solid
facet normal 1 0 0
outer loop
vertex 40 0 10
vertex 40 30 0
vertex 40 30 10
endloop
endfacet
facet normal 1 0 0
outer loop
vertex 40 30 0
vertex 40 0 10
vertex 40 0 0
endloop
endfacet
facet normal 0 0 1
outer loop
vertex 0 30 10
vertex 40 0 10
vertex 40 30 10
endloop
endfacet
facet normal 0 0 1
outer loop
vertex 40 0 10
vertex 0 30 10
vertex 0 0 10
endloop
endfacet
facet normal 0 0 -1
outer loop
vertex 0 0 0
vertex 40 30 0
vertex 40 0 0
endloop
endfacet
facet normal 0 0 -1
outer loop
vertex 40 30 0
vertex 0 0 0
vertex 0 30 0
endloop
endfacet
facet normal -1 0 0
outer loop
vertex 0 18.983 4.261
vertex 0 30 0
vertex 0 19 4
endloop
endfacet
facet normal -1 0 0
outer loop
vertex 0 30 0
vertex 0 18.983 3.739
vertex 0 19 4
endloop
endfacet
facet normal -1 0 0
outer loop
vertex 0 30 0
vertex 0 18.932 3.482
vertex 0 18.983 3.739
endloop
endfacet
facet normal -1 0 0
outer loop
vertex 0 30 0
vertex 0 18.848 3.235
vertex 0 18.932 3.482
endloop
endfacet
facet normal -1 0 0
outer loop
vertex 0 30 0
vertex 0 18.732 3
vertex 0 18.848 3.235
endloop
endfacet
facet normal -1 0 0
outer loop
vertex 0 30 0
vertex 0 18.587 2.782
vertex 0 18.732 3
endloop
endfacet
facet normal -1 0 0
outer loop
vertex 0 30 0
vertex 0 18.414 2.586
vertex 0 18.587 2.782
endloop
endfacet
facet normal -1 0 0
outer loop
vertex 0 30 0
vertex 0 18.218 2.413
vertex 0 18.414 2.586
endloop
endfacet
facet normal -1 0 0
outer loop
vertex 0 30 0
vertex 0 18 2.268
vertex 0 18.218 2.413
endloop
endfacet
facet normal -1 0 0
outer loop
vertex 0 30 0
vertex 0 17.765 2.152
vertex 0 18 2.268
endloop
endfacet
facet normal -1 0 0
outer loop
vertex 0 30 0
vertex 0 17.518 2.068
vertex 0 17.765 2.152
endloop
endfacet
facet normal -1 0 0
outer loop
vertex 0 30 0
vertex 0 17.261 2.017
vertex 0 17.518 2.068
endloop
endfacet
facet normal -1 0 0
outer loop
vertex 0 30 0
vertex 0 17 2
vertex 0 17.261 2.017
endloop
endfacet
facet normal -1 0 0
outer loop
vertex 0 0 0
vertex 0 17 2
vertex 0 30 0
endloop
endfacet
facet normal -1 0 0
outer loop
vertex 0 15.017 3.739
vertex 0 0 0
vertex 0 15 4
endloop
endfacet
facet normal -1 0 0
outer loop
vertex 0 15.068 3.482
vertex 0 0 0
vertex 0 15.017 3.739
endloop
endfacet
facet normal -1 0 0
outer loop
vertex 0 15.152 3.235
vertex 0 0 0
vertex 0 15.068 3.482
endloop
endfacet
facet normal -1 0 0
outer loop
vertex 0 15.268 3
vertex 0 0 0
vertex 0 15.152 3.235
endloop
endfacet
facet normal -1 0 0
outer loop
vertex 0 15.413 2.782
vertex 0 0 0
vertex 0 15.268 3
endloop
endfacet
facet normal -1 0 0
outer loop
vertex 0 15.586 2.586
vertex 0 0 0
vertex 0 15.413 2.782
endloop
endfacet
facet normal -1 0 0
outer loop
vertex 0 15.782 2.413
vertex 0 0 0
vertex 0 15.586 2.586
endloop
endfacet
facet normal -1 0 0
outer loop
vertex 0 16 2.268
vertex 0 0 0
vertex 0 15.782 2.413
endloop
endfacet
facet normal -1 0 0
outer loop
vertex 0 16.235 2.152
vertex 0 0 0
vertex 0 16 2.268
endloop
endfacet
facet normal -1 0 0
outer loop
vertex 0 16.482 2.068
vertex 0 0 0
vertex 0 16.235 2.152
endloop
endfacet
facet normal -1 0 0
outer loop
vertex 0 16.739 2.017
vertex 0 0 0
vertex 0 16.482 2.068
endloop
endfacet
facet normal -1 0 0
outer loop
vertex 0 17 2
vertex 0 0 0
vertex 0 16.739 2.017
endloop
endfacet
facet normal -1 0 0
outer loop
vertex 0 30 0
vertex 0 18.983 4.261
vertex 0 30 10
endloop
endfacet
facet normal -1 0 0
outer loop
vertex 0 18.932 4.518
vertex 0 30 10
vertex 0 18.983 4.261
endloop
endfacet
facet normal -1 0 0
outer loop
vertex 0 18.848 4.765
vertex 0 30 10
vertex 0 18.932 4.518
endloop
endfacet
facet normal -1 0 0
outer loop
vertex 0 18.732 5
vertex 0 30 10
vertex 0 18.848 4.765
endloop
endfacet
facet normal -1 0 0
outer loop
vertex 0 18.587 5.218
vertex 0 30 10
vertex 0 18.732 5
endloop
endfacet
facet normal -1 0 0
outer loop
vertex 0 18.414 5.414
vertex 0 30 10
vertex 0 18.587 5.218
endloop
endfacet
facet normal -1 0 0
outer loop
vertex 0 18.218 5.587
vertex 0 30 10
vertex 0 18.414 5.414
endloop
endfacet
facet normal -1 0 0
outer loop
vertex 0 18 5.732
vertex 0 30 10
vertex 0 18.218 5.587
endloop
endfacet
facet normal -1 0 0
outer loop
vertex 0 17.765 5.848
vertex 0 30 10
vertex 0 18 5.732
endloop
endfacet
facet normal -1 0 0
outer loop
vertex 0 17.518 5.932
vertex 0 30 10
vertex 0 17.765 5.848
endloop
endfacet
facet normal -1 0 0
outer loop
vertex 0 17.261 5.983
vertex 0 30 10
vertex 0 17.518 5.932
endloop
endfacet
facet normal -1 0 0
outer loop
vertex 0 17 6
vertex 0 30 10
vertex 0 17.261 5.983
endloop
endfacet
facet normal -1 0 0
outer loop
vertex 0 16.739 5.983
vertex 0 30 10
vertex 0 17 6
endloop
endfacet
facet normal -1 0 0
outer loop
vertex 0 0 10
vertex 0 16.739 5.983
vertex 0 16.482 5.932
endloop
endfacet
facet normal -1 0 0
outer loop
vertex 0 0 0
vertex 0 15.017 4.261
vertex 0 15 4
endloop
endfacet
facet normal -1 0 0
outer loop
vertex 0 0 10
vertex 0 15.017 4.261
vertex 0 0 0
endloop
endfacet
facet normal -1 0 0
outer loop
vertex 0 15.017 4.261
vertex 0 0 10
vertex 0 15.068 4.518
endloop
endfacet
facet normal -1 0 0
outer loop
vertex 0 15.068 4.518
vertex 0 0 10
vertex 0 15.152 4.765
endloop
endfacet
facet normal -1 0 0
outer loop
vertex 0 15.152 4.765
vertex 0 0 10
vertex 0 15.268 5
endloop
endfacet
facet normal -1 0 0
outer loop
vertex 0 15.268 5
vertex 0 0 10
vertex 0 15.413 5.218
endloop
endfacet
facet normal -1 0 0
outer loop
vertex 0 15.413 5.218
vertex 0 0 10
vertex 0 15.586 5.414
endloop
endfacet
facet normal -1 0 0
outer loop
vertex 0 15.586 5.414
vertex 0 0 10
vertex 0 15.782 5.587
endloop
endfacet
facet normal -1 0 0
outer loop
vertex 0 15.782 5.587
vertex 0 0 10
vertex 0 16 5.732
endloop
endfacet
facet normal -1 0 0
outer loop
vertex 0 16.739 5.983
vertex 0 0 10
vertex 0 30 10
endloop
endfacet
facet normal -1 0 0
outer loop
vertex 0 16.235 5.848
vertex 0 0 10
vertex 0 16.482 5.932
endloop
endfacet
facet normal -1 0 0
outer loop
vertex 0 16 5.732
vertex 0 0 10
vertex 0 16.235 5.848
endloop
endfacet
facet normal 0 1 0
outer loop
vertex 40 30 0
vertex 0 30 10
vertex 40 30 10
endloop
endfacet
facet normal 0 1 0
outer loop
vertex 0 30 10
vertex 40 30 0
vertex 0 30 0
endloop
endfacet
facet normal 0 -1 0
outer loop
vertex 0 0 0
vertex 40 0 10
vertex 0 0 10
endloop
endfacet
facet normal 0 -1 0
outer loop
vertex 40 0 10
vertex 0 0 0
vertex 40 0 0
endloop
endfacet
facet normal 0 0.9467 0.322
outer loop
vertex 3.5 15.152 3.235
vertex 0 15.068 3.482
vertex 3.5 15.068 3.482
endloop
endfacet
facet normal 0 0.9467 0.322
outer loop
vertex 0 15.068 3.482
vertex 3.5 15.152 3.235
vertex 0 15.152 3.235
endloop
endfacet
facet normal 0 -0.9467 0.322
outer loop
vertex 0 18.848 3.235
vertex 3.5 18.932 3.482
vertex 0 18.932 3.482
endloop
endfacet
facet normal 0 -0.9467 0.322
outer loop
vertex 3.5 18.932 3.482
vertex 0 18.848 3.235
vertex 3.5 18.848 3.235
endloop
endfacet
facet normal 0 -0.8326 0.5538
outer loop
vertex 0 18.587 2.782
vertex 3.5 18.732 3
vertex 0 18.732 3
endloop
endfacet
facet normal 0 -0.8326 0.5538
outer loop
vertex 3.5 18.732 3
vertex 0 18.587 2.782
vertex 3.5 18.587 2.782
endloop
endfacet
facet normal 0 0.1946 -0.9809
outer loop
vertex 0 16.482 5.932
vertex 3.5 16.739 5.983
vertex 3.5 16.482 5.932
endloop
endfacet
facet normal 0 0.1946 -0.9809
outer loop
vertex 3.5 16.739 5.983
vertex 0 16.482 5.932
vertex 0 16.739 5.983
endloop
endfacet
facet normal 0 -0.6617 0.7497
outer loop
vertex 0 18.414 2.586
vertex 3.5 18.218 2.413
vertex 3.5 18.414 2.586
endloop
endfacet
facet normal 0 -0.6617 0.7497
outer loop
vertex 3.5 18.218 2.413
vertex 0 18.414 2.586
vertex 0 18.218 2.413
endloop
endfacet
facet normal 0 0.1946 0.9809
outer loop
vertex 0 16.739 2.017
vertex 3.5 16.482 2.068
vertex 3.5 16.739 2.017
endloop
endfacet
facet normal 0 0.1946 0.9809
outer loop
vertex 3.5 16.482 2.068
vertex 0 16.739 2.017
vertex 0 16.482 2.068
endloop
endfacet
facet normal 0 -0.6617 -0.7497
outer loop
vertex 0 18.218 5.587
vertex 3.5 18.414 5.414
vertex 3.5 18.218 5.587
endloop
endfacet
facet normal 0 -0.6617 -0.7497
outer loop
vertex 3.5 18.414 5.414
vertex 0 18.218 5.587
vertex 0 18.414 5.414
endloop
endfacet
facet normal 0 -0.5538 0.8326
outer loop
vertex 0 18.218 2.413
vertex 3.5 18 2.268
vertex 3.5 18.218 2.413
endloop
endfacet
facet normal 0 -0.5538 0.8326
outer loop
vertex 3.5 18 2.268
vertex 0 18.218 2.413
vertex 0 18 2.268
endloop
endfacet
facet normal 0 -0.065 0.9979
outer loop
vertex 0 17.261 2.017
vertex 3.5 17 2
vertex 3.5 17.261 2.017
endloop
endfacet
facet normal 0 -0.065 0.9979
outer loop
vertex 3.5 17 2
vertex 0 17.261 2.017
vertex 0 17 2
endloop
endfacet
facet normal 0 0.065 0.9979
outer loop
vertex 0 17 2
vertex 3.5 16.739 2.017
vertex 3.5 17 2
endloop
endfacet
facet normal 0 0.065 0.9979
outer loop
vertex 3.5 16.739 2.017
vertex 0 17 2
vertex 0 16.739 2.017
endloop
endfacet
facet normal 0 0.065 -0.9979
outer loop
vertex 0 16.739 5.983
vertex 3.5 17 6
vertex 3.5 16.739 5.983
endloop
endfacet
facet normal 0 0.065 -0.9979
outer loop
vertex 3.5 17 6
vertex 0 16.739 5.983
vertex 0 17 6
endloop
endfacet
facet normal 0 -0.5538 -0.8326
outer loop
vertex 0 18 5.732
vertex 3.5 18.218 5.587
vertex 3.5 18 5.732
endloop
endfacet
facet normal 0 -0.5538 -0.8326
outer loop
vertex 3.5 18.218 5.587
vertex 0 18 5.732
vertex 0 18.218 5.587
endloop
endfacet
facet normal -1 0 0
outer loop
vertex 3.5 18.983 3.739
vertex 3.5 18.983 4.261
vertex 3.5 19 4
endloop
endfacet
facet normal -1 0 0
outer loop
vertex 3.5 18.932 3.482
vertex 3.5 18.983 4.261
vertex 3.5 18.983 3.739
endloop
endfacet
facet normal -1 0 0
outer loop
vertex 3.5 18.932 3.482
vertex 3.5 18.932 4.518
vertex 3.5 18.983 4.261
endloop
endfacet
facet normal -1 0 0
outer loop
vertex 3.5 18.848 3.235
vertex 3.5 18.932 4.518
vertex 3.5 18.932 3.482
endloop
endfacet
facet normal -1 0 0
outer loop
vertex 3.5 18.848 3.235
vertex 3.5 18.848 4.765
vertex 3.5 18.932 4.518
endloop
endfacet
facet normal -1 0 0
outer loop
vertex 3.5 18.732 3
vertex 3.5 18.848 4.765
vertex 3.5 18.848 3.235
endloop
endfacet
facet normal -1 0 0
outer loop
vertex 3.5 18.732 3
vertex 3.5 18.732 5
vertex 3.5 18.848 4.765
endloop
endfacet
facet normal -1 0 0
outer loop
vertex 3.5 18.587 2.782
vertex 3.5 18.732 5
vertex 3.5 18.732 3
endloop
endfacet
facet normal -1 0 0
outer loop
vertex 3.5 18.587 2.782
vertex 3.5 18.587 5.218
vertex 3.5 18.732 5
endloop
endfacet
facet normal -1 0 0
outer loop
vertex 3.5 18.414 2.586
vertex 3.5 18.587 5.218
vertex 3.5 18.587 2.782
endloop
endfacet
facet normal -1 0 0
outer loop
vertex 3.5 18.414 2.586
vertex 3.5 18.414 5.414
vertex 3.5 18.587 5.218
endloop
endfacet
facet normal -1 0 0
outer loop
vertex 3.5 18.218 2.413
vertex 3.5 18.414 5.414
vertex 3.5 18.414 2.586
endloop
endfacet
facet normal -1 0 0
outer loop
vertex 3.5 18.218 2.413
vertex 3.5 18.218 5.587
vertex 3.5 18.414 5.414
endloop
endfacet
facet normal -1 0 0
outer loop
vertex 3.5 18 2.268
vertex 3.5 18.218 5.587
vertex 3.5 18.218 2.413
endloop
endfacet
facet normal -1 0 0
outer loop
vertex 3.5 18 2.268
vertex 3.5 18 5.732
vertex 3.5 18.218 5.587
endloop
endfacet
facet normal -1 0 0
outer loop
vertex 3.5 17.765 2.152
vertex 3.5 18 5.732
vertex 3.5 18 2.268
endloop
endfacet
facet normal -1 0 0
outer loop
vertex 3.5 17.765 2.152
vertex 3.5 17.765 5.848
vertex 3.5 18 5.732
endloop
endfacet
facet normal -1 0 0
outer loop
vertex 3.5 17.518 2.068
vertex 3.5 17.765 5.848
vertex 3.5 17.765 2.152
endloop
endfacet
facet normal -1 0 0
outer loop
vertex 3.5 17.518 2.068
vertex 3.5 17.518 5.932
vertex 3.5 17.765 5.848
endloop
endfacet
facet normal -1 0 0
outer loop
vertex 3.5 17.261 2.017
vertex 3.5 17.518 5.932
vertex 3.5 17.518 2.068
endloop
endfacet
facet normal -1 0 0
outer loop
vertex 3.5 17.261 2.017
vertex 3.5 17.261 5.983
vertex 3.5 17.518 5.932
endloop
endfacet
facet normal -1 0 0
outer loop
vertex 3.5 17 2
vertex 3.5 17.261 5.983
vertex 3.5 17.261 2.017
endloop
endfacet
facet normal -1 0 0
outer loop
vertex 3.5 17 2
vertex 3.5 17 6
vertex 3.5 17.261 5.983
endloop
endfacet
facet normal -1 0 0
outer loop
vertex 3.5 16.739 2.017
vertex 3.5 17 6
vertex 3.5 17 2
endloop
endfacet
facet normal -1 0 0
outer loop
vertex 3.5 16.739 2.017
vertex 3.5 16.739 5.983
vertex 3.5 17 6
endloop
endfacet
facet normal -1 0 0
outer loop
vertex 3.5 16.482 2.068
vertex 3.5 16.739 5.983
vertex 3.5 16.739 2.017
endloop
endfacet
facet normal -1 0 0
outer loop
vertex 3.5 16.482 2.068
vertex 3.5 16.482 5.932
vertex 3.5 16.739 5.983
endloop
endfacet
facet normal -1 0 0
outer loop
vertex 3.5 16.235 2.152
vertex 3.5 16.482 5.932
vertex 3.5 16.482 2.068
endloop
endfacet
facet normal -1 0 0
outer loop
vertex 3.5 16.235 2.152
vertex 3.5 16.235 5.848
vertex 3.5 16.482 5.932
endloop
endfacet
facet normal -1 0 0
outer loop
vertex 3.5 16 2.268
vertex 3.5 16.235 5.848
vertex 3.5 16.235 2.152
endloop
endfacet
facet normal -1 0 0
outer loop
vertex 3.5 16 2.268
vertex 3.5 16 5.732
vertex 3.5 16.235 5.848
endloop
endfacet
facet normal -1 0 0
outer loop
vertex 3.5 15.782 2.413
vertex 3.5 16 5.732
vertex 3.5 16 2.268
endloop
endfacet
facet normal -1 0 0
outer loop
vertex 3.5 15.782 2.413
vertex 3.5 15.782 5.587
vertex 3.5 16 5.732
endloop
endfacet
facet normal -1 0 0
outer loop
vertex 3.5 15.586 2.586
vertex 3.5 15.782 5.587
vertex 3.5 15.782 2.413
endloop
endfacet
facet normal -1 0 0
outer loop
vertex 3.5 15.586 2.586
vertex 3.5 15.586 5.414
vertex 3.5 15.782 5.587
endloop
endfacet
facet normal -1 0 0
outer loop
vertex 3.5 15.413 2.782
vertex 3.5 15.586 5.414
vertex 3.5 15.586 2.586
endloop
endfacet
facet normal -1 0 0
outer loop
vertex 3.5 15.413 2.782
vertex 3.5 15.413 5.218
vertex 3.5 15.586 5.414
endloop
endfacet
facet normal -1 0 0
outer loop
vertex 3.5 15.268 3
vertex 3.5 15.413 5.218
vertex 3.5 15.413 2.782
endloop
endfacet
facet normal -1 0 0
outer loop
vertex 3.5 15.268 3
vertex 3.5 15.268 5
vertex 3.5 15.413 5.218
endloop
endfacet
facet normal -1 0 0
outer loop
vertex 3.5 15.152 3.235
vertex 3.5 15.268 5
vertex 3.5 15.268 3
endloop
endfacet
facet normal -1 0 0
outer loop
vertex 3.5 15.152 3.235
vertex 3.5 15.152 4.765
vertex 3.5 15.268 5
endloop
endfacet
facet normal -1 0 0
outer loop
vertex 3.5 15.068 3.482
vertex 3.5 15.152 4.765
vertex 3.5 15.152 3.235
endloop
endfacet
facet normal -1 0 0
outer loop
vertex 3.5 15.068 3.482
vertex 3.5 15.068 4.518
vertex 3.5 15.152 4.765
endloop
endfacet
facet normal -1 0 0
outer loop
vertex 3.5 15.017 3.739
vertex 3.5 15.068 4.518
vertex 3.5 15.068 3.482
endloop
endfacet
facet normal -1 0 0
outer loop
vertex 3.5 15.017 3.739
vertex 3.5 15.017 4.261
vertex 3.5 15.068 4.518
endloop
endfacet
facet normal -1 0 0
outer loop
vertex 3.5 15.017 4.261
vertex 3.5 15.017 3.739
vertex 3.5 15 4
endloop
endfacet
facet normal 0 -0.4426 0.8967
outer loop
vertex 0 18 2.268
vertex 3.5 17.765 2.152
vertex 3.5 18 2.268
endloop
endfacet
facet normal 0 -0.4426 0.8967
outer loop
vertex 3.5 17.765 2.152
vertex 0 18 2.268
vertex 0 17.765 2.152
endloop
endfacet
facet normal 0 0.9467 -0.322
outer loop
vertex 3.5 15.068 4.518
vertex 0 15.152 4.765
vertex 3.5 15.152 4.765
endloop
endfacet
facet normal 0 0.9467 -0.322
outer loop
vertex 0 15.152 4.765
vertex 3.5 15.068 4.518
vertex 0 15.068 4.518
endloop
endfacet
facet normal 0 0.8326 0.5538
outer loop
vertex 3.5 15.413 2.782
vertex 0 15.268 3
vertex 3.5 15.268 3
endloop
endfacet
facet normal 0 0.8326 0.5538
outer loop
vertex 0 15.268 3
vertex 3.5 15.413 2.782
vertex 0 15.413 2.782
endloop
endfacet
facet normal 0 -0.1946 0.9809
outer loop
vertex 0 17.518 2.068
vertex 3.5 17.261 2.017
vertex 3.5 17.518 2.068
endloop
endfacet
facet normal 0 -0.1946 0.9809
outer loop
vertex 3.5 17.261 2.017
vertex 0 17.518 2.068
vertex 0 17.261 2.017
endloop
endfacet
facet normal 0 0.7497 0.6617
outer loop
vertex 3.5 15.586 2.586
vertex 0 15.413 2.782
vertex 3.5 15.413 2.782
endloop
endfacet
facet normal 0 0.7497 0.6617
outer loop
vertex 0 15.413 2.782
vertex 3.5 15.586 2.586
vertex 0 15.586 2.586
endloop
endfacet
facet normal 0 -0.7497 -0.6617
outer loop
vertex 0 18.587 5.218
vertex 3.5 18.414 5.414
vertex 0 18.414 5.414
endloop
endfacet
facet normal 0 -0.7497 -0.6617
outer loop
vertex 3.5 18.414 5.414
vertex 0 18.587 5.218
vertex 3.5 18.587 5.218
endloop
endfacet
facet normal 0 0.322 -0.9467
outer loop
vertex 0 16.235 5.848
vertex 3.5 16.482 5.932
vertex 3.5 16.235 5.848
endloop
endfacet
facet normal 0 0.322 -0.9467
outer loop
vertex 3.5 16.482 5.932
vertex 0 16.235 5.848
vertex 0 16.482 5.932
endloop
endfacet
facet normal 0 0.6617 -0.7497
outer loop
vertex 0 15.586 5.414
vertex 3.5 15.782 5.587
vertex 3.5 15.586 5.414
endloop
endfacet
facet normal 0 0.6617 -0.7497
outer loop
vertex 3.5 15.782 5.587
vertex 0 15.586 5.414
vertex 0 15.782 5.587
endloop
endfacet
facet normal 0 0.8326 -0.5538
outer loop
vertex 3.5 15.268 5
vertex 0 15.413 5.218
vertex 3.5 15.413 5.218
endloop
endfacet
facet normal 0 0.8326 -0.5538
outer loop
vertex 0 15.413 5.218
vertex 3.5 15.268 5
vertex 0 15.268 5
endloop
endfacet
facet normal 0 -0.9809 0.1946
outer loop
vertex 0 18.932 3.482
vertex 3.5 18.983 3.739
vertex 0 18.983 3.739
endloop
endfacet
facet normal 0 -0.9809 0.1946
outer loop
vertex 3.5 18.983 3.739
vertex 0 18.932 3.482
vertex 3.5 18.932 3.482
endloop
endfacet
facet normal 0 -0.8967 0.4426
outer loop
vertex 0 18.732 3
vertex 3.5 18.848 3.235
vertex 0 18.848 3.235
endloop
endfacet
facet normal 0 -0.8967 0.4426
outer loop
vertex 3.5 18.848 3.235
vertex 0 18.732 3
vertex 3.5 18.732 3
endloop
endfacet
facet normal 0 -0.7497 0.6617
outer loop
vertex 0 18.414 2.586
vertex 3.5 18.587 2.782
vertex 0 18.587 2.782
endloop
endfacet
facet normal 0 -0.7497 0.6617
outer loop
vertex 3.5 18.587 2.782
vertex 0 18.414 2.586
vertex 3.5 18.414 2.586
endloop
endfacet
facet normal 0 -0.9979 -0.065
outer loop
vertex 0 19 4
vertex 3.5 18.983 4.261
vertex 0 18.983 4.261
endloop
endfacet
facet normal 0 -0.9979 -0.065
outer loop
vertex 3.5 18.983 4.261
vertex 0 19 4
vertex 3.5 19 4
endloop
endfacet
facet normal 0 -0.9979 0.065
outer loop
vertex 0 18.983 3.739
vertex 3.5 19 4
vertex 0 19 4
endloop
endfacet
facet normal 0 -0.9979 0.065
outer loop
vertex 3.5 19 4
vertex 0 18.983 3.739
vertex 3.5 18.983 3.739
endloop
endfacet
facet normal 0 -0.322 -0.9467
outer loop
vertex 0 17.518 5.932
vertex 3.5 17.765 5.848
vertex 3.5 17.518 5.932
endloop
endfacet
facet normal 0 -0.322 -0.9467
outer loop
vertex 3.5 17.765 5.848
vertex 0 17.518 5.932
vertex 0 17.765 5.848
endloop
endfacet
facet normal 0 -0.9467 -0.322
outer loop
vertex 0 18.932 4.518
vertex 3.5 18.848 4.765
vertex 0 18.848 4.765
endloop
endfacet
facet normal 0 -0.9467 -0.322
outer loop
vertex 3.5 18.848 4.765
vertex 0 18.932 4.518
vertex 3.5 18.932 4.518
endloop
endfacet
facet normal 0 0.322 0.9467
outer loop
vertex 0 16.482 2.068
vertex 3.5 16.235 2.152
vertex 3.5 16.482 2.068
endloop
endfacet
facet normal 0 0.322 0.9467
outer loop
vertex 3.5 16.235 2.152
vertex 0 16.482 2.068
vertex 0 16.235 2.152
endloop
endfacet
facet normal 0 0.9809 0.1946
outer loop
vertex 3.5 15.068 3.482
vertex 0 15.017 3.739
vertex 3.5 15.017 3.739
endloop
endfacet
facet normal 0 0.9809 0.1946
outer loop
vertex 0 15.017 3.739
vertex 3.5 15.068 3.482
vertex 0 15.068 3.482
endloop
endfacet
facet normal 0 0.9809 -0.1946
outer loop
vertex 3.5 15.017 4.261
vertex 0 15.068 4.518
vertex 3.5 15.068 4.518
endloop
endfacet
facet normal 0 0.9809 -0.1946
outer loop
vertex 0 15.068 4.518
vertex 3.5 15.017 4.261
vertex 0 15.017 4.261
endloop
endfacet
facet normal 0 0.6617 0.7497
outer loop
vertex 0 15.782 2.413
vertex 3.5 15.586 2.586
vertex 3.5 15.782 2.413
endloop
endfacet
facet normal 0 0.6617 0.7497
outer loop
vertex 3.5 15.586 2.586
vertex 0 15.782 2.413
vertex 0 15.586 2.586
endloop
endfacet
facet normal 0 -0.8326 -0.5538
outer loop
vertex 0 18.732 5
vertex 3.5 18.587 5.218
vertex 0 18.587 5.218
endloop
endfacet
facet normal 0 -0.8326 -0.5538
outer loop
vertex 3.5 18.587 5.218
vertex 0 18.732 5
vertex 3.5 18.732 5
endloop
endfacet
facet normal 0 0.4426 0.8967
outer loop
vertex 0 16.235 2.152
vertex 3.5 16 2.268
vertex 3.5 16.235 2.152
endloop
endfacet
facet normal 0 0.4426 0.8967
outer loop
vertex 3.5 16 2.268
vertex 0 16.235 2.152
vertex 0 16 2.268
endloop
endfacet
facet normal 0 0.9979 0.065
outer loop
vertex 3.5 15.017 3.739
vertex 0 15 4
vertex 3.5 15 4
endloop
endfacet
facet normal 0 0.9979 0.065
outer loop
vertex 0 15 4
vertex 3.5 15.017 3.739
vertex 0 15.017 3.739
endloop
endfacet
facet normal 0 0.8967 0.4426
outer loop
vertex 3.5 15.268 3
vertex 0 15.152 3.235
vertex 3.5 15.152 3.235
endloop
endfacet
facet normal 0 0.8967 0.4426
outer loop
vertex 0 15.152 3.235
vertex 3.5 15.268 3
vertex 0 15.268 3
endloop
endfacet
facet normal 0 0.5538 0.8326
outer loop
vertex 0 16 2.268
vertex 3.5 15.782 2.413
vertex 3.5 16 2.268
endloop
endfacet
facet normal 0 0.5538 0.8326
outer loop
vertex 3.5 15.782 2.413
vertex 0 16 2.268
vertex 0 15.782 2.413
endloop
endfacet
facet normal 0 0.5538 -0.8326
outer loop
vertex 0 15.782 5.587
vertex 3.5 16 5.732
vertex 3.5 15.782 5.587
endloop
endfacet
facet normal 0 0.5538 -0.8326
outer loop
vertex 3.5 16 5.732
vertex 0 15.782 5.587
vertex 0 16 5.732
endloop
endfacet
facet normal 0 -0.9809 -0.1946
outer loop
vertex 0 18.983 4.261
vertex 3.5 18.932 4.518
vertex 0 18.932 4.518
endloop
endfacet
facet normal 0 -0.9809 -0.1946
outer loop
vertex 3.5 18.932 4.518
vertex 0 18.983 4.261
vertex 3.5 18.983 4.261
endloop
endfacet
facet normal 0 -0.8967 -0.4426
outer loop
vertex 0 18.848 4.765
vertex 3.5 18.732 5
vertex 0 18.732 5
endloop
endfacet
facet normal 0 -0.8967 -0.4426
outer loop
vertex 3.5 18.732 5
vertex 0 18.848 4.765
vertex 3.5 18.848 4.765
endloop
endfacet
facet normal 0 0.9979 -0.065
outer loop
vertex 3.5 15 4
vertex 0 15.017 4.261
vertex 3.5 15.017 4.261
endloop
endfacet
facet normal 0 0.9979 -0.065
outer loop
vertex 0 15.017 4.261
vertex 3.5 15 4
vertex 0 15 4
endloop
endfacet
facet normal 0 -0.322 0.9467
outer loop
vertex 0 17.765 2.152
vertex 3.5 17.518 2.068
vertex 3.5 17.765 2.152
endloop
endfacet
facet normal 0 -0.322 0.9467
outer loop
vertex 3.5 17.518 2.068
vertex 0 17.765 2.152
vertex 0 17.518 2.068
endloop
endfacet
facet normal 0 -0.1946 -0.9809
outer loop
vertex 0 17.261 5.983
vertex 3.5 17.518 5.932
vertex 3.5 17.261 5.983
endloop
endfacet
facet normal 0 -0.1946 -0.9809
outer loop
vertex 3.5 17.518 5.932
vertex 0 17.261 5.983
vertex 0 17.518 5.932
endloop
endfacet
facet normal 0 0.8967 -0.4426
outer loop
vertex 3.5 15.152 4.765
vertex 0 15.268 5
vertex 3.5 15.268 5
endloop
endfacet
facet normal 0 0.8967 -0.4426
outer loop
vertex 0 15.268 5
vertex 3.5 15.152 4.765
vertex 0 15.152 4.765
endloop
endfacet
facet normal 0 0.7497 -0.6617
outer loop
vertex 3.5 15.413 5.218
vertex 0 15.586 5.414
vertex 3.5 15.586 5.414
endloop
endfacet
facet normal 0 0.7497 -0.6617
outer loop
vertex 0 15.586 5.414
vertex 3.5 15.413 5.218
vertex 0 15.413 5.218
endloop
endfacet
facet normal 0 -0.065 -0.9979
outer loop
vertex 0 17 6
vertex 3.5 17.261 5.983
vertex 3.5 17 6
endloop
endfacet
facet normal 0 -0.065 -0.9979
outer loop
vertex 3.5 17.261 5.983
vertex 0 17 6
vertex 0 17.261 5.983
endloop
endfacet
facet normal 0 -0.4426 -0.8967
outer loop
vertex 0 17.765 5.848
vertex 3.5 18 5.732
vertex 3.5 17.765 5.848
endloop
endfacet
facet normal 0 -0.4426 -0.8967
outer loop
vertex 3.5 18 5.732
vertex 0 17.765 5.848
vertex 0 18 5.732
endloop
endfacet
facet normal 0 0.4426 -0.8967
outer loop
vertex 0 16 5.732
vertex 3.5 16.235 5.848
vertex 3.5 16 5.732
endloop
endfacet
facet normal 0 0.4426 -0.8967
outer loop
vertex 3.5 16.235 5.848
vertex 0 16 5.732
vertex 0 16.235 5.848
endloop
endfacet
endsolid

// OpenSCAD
// units=mm — generated by scad_emitter.py
// part=unnamed
$fn = 48;

difference() { cube([40, 30, 10]); translate([-0.5, 17, 4]) rotate([0, 90, 0]) cylinder(h=4, r=2, $fn=$fn); }
